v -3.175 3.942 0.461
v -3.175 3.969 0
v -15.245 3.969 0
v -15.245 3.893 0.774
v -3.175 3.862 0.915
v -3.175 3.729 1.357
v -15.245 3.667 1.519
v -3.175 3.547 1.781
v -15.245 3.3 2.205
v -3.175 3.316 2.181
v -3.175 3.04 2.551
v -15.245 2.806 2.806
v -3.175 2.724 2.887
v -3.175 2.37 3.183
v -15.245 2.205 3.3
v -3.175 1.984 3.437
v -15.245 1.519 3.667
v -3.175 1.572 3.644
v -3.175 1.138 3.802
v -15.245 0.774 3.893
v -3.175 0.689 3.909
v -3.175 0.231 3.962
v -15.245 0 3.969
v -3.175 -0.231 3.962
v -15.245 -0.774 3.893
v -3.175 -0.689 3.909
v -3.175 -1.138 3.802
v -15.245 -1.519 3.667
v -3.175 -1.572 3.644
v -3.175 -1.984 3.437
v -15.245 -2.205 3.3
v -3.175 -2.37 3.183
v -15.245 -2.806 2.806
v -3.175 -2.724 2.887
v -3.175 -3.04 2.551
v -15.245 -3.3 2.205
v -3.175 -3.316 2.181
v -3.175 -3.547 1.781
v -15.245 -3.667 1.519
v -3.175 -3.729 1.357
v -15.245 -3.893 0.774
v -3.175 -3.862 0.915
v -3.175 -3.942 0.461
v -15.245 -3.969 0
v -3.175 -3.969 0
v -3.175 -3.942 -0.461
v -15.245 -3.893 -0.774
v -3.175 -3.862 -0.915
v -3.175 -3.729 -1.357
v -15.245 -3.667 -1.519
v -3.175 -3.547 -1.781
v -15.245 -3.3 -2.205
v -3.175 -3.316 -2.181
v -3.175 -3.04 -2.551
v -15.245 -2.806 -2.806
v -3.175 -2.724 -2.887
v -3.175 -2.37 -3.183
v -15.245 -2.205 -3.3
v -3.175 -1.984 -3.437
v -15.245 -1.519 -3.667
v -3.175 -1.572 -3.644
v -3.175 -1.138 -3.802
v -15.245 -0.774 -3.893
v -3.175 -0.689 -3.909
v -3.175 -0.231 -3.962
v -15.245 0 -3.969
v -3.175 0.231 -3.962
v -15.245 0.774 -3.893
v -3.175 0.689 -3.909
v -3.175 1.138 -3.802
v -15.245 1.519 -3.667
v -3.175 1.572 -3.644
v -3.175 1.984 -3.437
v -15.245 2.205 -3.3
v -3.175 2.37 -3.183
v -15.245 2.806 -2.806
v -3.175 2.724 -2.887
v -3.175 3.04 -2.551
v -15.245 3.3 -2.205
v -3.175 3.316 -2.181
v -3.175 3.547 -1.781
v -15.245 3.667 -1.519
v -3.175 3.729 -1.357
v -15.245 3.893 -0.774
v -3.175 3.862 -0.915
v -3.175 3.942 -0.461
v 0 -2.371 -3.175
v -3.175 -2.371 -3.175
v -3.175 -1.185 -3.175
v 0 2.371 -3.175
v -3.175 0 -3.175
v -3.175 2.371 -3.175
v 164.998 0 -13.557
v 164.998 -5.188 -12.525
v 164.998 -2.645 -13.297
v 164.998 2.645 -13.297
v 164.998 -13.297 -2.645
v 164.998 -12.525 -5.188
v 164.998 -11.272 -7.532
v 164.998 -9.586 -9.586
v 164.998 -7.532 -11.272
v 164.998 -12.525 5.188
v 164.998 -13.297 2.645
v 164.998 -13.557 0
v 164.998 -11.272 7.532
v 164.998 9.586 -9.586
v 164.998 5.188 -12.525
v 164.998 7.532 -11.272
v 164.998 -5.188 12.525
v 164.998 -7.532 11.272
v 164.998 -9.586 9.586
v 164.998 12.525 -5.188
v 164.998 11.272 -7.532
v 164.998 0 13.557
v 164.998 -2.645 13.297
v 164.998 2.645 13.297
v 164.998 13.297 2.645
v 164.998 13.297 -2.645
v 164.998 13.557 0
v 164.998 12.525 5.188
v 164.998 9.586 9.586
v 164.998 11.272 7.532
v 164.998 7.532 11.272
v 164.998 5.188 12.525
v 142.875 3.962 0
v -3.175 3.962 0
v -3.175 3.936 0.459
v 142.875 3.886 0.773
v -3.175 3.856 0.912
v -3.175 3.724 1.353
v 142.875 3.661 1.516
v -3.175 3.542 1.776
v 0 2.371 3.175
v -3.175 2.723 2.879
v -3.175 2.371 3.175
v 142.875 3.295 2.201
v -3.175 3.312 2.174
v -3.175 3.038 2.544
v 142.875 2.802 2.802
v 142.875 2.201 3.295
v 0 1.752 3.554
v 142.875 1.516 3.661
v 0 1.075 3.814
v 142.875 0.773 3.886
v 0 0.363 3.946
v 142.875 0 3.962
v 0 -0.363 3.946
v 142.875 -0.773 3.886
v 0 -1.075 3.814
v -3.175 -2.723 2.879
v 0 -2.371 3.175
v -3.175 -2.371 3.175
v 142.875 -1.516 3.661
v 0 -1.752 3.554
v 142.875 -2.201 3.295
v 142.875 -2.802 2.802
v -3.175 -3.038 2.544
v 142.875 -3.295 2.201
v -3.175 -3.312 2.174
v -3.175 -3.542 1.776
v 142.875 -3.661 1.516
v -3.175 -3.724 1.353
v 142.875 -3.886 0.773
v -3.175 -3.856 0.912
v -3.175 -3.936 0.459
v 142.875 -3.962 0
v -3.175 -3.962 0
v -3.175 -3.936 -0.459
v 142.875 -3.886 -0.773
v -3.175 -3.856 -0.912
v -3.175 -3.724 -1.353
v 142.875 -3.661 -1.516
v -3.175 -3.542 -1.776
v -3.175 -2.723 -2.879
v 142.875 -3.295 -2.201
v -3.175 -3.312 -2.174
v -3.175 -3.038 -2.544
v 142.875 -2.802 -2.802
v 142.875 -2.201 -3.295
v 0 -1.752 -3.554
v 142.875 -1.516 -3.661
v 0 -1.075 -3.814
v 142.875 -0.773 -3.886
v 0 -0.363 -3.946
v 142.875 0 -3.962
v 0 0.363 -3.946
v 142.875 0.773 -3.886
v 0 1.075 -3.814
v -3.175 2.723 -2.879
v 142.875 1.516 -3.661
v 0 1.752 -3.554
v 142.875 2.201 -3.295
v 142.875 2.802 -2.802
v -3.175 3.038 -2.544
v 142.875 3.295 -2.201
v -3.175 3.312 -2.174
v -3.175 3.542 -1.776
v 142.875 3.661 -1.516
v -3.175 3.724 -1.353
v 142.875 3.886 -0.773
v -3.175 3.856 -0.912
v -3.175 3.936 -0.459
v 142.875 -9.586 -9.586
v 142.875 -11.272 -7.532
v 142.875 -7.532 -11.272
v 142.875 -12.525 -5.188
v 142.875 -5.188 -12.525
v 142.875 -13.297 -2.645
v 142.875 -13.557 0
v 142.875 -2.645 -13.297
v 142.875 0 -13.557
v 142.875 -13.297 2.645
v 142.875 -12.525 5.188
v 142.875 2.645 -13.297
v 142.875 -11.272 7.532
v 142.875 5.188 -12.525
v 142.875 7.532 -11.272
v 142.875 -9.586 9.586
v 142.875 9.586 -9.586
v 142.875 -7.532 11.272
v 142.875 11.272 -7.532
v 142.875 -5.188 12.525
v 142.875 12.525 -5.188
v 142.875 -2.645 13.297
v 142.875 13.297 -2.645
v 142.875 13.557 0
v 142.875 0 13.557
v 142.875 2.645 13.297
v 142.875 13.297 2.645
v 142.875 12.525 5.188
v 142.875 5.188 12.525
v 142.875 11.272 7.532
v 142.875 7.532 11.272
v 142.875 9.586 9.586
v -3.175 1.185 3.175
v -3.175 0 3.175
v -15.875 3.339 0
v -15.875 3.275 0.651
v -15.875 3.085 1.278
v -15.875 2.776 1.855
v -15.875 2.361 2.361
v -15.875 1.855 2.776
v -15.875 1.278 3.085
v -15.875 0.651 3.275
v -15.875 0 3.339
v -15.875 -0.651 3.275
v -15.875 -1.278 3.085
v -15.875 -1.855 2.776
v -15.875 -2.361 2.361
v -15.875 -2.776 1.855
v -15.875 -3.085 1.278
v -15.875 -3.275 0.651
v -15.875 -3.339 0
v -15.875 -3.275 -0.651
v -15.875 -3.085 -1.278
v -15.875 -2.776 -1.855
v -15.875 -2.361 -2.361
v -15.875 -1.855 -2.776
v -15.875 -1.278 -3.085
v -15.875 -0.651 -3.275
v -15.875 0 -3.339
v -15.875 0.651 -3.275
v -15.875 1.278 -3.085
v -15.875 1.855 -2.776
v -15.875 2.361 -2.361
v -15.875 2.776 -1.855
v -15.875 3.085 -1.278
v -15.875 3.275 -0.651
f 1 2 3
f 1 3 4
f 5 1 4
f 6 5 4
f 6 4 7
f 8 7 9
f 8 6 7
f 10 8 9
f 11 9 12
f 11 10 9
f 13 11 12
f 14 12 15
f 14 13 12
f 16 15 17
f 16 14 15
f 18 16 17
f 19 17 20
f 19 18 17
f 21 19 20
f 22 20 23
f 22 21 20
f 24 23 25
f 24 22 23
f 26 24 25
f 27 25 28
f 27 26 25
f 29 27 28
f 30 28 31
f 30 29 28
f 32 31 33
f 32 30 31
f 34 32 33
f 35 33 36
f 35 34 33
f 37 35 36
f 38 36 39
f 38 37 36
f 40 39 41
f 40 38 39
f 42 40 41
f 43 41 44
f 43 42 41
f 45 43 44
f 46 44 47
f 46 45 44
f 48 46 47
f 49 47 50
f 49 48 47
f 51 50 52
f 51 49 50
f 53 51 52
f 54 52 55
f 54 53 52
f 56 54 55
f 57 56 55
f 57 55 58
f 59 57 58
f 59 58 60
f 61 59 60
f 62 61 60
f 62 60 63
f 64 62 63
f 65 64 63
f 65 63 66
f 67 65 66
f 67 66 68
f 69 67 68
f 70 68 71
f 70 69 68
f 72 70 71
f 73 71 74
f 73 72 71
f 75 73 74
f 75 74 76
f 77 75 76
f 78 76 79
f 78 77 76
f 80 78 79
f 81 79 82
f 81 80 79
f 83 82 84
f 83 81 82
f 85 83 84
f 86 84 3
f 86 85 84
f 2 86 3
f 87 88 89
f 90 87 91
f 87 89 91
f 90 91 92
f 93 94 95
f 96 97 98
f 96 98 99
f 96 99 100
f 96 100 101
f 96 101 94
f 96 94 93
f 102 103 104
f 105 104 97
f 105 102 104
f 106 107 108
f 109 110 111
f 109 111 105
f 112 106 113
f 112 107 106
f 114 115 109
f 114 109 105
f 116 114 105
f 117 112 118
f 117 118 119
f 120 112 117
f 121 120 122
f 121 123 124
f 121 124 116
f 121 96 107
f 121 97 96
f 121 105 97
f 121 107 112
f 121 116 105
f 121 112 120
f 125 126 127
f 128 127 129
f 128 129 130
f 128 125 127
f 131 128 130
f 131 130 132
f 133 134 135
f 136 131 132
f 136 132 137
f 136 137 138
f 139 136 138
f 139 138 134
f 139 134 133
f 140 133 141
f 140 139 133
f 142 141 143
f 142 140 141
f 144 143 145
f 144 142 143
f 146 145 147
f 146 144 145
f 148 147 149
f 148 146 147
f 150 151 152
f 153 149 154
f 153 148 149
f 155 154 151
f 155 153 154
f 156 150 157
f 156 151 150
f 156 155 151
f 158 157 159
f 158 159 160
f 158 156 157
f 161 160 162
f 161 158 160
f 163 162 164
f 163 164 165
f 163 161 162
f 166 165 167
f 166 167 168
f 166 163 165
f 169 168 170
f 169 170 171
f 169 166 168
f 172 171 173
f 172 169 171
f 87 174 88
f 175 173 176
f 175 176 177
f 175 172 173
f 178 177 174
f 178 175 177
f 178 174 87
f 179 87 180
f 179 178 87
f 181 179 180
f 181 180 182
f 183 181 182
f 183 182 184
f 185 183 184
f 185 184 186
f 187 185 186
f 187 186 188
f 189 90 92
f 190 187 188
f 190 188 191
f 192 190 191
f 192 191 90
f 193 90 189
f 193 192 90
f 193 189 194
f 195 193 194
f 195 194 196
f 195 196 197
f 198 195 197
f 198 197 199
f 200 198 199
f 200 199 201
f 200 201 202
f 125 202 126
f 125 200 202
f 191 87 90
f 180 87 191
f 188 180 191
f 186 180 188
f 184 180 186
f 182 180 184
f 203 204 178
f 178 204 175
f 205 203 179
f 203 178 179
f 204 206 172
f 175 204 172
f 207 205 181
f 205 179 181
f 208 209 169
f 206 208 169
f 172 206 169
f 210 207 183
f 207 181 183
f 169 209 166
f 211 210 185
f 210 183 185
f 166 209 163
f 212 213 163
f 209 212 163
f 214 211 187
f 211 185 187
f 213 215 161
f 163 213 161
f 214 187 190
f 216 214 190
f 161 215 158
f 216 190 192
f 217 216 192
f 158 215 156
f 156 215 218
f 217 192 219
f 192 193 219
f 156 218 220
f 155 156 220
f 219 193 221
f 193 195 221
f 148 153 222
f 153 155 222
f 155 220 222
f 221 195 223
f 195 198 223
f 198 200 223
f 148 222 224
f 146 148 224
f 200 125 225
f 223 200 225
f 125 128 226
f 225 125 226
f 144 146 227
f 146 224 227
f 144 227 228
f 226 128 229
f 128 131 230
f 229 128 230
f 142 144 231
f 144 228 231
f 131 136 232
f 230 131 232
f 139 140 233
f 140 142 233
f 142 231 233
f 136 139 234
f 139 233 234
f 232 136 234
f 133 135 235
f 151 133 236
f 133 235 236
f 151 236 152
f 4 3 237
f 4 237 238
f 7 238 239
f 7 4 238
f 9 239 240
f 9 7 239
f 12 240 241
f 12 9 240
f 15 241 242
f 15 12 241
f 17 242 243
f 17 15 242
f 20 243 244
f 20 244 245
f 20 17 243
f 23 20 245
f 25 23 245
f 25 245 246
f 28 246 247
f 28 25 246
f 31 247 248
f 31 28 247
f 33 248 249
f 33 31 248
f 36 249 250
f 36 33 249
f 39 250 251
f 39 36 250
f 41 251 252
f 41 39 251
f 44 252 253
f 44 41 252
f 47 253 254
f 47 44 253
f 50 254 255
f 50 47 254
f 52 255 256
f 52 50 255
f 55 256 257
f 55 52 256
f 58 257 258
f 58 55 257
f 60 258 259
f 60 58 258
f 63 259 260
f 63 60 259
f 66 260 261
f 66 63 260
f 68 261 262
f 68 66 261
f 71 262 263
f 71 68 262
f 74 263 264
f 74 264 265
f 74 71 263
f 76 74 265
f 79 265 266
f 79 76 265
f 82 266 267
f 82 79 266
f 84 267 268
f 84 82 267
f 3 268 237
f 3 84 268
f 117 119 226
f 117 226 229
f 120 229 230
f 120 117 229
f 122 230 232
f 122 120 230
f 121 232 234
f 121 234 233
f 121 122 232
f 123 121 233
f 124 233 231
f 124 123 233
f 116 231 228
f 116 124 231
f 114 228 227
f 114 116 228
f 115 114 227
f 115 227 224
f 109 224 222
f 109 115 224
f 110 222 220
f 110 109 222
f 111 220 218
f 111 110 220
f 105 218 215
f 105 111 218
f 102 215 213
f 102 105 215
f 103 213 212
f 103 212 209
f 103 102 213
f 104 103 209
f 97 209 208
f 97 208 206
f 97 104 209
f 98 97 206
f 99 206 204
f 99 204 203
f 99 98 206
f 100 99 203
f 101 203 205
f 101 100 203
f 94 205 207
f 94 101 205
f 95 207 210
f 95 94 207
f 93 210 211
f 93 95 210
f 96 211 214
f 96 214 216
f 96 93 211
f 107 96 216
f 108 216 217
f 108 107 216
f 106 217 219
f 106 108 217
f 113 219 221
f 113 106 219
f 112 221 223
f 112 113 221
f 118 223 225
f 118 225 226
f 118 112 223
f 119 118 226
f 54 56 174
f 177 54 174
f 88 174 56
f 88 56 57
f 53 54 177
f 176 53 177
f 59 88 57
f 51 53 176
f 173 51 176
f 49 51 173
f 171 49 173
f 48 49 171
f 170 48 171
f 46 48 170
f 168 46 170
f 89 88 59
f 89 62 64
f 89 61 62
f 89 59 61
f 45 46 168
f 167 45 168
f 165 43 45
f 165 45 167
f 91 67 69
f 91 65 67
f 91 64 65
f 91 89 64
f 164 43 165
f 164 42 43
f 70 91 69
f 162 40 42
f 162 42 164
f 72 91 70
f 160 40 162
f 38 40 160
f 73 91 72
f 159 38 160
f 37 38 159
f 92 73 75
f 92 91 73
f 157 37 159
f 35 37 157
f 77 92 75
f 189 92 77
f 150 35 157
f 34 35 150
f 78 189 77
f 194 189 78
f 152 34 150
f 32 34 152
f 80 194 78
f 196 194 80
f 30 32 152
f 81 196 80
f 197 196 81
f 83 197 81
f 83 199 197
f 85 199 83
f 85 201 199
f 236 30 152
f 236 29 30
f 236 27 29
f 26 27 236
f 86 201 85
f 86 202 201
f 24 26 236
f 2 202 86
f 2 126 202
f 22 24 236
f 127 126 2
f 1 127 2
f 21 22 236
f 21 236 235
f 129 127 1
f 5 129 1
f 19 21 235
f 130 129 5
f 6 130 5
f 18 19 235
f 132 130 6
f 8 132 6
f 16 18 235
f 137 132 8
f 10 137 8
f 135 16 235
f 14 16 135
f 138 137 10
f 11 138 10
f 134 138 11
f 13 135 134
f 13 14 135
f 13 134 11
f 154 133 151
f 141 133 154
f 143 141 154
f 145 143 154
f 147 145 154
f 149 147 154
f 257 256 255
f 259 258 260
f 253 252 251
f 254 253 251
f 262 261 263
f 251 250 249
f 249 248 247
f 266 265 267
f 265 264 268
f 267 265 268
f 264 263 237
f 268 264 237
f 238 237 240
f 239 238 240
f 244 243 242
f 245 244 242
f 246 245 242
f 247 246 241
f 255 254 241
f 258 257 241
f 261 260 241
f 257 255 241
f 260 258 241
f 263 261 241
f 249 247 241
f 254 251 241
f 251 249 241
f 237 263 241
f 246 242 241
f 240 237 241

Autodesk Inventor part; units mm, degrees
sketch "Sketch_1" plane through (0, 0, 0) normal (0, 0, 1) x (1, 0, 0)
  line L0 (164.9984, 0) -> (-3.175, 0)
  line L1 (-3.175, 0) -> (-3.175, 3.9624)
  line L2 (-3.175, 3.9624) -> (142.875, 3.9624)
  line L3 (142.875, 3.9624) -> (142.875, 13.5572)
  line L4 (142.875, 13.5572) -> (164.9984, 13.5572)
  line L5 (164.9984, 13.5572) -> (164.9984, 0)
  line L6 (164.9984, 0) -> (-3.175, 0)
revolve "Revolution1" add sketch "Sketch_1" angle 360 about axis through (164.9984, 0, 0) along (1, 0, 0)
sketch "Sketch_3" plane through (0, 0, 0) normal (0, 0, 1) x (1, 0, 0)
  line L0 (-3.175, 0) -> (-15.875, 0)
  line L1 (-15.875, 0) -> (-15.875, 3.3388)
  line L2 (-15.875, 3.3388) -> (-15.2451, 3.9688)
  line L3 (-15.2451, 3.9688) -> (-3.175, 3.9688)
  line L4 (-3.175, 3.9688) -> (-3.175, 0)
  line L5 (-3.175, 0) -> (-15.875, 0)
revolve "Revolution2" add sketch "Sketch_3" angle 360 about axis through (-3.175, 0, 0) along (1, 0, 0)
thread "Thread1" size "5/16-24 UNF" class "2A" standard "ANSI Unified Screw Threads" full length
sketch "Sketch_10" plane through (-3.175, 0, 0) normal (1, 0, 0) x (0, 0, -1)
  line L0 (-7.9248, -7.9248) -> (7.9248, -7.9248)
  line L1 (7.9248, -7.9248) -> (7.9248, 7.9248)
  line L2 (7.9248, 7.9248) -> (-7.9248, 7.9248)
  line L3 (-7.9248, 7.9248) -> (-7.9248, -7.9248)
  line L4 (-3.175, -3.9624) -> (3.175, -3.9624)
  line L5 (3.175, -3.9624) -> (3.175, 3.9624)
  line L6 (3.175, 3.9624) -> (-3.175, 3.9624)
  line L7 (-3.175, 3.9624) -> (-3.175, -3.9624)
extrude "Extrusion1" cut sketch "Sketch_10" along normal blind 3.175
ref_plane "dia1_XY" through (-3.175, 3.9624, 0) normal (1, 0, 0) x (0, 0, -1)
ref_plane "dia1_YZ" through (-3.175, 3.9624, 0) normal (0, 0, -1) x (0, 1, 0)
ref_plane "dia1_ZX" through (-3.175, 3.9624, 0) normal (0, 1, 0) x (1, 0, 0)
ref_plane "dia12_XY" through (0, 0, 14.1351) normal (1, 0, 0) x (0, 0, -1)
ref_plane "dia12_YZ" through (0, 0, 14.1351) normal (0, 0, -1) x (0, 1, 0)
ref_plane "dia12_ZX" through (0, 0, 14.1351) normal (0, 1, 0) x (1, 0, 0)
ref_plane "dia2_XY" through (-3.175, -3.9624, 0) normal (1, 0, 0) x (0, 0, -1)
ref_plane "dia2_YZ" through (-3.175, -3.9624, 0) normal (0, 0, -1) x (0, 1, 0)
ref_plane "dia2_ZX" through (-3.175, -3.9624, 0) normal (0, 1, 0) x (1, 0, 0)
ref_plane "dia22_XY" through (0, 0, -14.1351) normal (1, 0, 0) x (0, 0, -1)
ref_plane "dia22_YZ" through (0, 0, -14.1351) normal (0, 0, -1) x (0, 1, 0)
ref_plane "dia22_ZX" through (0, 0, -14.1351) normal (0, 1, 0) x (1, 0, 0)
ref_plane "rl1_XY" through (-15.875, 0, 0) normal (1, 0, 0) x (0, 0, -1)
ref_plane "rl1_YZ" through (-15.875, 0, 0) normal (0, 0, -1) x (0, 1, 0)
ref_plane "rl1_ZX" through (-15.875, 0, 0) normal (0, 1, 0) x (1, 0, 0)
ref_plane "rl2_XY" through (-3.175, 0, 0) normal (1, 0, 0) x (0, 0, -1)
ref_plane "rl2_YZ" through (-3.175, 0, 0) normal (0, 0, -1) x (0, 1, 0)
ref_plane "rl2_ZX" through (-3.175, 0, 0) normal (0, 1, 0) x (1, 0, 0)
ref_plane "rod_cp_XY" through (0, 0, 0) normal (1, 0, 0) x (0, 0, -1)
ref_plane "rod_cp_YZ" through (0, 0, 0) normal (0, 0, -1) x (0, 1, 0)
ref_plane "rod_cp_ZX" through (0, 0, 0) normal (0, 1, 0) x (1, 0, 0)
ref_plane "thd1_XY" through (-15.875, 3.9688, 0) normal (1, 0, 0) x (0, 0, -1)
ref_plane "thd1_YZ" through (-15.875, 3.9688, 0) normal (0, 0, -1) x (0, 1, 0)
ref_plane "thd1_ZX" through (-15.875, 3.9688, 0) normal (0, 1, 0) x (1, 0, 0)
ref_plane "thd2_XY" through (-15.875, -3.9688, 0) normal (1, 0, 0) x (0, 0, -1)
ref_plane "thd2_YZ" through (-15.875, -3.9688, 0) normal (0, 0, -1) x (0, 1, 0)
ref_plane "thd2_ZX" through (-15.875, -3.9688, 0) normal (0, 1, 0) x (1, 0, 0)
ref_plane "to_rod_clevis_XY" through (-20.701, 0, 0) normal (1, 0, 0) x (0, 0, -1)
ref_plane "to_rod_clevis_YZ" through (-20.701, 0, 0) normal (0, 0, -1) x (0, 1, 0)
ref_plane "to_rod_clevis_ZX" through (-20.701, 0, 0) normal (0, 1, 0) x (1, 0, 0)
ref_plane "wf1_XY" through (-3.175, 0, 0) normal (1, 0, 0) x (0, 0, -1)
ref_plane "wf1_YZ" through (-3.175, 0, 0) normal (0, 0, -1) x (0, 1, 0)
ref_plane "wf1_ZX" through (-3.175, 0, 0) normal (0, 1, 0) x (1, 0, 0)
ref_plane "wf2_XY" through (0, 0, 0) normal (1, 0, 0) x (0, 0, -1)
ref_plane "wf2_YZ" through (0, 0, 0) normal (0, 0, -1) x (0, 1, 0)
ref_plane "wf2_ZX" through (0, 0, 0) normal (0, 1, 0) x (1, 0, 0)
ref_plane "wfw1_XY" through (-3.175, 0, -3.175) normal (0, 1, 0) x (1, 0, 0)
ref_plane "wfw1_YZ" through (-3.175, 0, -3.175) normal (1, 0, 0) x (0, 0, -1)
ref_plane "wfw1_ZX" through (-3.175, 0, -3.175) normal (0, 0, -1) x (0, 1, 0)
ref_plane "wfw2_XY" through (-3.175, 0, 3.175) normal (0, 1, 0) x (1, 0, 0)
ref_plane "wfw2_YZ" through (-3.175, 0, 3.175) normal (1, 0, 0) x (0, 0, -1)
ref_plane "wfw2_ZX" through (-3.175, 0, 3.175) normal (0, 0, -1) x (0, 1, 0)
properties part number "C-094-DP0000_rod"
